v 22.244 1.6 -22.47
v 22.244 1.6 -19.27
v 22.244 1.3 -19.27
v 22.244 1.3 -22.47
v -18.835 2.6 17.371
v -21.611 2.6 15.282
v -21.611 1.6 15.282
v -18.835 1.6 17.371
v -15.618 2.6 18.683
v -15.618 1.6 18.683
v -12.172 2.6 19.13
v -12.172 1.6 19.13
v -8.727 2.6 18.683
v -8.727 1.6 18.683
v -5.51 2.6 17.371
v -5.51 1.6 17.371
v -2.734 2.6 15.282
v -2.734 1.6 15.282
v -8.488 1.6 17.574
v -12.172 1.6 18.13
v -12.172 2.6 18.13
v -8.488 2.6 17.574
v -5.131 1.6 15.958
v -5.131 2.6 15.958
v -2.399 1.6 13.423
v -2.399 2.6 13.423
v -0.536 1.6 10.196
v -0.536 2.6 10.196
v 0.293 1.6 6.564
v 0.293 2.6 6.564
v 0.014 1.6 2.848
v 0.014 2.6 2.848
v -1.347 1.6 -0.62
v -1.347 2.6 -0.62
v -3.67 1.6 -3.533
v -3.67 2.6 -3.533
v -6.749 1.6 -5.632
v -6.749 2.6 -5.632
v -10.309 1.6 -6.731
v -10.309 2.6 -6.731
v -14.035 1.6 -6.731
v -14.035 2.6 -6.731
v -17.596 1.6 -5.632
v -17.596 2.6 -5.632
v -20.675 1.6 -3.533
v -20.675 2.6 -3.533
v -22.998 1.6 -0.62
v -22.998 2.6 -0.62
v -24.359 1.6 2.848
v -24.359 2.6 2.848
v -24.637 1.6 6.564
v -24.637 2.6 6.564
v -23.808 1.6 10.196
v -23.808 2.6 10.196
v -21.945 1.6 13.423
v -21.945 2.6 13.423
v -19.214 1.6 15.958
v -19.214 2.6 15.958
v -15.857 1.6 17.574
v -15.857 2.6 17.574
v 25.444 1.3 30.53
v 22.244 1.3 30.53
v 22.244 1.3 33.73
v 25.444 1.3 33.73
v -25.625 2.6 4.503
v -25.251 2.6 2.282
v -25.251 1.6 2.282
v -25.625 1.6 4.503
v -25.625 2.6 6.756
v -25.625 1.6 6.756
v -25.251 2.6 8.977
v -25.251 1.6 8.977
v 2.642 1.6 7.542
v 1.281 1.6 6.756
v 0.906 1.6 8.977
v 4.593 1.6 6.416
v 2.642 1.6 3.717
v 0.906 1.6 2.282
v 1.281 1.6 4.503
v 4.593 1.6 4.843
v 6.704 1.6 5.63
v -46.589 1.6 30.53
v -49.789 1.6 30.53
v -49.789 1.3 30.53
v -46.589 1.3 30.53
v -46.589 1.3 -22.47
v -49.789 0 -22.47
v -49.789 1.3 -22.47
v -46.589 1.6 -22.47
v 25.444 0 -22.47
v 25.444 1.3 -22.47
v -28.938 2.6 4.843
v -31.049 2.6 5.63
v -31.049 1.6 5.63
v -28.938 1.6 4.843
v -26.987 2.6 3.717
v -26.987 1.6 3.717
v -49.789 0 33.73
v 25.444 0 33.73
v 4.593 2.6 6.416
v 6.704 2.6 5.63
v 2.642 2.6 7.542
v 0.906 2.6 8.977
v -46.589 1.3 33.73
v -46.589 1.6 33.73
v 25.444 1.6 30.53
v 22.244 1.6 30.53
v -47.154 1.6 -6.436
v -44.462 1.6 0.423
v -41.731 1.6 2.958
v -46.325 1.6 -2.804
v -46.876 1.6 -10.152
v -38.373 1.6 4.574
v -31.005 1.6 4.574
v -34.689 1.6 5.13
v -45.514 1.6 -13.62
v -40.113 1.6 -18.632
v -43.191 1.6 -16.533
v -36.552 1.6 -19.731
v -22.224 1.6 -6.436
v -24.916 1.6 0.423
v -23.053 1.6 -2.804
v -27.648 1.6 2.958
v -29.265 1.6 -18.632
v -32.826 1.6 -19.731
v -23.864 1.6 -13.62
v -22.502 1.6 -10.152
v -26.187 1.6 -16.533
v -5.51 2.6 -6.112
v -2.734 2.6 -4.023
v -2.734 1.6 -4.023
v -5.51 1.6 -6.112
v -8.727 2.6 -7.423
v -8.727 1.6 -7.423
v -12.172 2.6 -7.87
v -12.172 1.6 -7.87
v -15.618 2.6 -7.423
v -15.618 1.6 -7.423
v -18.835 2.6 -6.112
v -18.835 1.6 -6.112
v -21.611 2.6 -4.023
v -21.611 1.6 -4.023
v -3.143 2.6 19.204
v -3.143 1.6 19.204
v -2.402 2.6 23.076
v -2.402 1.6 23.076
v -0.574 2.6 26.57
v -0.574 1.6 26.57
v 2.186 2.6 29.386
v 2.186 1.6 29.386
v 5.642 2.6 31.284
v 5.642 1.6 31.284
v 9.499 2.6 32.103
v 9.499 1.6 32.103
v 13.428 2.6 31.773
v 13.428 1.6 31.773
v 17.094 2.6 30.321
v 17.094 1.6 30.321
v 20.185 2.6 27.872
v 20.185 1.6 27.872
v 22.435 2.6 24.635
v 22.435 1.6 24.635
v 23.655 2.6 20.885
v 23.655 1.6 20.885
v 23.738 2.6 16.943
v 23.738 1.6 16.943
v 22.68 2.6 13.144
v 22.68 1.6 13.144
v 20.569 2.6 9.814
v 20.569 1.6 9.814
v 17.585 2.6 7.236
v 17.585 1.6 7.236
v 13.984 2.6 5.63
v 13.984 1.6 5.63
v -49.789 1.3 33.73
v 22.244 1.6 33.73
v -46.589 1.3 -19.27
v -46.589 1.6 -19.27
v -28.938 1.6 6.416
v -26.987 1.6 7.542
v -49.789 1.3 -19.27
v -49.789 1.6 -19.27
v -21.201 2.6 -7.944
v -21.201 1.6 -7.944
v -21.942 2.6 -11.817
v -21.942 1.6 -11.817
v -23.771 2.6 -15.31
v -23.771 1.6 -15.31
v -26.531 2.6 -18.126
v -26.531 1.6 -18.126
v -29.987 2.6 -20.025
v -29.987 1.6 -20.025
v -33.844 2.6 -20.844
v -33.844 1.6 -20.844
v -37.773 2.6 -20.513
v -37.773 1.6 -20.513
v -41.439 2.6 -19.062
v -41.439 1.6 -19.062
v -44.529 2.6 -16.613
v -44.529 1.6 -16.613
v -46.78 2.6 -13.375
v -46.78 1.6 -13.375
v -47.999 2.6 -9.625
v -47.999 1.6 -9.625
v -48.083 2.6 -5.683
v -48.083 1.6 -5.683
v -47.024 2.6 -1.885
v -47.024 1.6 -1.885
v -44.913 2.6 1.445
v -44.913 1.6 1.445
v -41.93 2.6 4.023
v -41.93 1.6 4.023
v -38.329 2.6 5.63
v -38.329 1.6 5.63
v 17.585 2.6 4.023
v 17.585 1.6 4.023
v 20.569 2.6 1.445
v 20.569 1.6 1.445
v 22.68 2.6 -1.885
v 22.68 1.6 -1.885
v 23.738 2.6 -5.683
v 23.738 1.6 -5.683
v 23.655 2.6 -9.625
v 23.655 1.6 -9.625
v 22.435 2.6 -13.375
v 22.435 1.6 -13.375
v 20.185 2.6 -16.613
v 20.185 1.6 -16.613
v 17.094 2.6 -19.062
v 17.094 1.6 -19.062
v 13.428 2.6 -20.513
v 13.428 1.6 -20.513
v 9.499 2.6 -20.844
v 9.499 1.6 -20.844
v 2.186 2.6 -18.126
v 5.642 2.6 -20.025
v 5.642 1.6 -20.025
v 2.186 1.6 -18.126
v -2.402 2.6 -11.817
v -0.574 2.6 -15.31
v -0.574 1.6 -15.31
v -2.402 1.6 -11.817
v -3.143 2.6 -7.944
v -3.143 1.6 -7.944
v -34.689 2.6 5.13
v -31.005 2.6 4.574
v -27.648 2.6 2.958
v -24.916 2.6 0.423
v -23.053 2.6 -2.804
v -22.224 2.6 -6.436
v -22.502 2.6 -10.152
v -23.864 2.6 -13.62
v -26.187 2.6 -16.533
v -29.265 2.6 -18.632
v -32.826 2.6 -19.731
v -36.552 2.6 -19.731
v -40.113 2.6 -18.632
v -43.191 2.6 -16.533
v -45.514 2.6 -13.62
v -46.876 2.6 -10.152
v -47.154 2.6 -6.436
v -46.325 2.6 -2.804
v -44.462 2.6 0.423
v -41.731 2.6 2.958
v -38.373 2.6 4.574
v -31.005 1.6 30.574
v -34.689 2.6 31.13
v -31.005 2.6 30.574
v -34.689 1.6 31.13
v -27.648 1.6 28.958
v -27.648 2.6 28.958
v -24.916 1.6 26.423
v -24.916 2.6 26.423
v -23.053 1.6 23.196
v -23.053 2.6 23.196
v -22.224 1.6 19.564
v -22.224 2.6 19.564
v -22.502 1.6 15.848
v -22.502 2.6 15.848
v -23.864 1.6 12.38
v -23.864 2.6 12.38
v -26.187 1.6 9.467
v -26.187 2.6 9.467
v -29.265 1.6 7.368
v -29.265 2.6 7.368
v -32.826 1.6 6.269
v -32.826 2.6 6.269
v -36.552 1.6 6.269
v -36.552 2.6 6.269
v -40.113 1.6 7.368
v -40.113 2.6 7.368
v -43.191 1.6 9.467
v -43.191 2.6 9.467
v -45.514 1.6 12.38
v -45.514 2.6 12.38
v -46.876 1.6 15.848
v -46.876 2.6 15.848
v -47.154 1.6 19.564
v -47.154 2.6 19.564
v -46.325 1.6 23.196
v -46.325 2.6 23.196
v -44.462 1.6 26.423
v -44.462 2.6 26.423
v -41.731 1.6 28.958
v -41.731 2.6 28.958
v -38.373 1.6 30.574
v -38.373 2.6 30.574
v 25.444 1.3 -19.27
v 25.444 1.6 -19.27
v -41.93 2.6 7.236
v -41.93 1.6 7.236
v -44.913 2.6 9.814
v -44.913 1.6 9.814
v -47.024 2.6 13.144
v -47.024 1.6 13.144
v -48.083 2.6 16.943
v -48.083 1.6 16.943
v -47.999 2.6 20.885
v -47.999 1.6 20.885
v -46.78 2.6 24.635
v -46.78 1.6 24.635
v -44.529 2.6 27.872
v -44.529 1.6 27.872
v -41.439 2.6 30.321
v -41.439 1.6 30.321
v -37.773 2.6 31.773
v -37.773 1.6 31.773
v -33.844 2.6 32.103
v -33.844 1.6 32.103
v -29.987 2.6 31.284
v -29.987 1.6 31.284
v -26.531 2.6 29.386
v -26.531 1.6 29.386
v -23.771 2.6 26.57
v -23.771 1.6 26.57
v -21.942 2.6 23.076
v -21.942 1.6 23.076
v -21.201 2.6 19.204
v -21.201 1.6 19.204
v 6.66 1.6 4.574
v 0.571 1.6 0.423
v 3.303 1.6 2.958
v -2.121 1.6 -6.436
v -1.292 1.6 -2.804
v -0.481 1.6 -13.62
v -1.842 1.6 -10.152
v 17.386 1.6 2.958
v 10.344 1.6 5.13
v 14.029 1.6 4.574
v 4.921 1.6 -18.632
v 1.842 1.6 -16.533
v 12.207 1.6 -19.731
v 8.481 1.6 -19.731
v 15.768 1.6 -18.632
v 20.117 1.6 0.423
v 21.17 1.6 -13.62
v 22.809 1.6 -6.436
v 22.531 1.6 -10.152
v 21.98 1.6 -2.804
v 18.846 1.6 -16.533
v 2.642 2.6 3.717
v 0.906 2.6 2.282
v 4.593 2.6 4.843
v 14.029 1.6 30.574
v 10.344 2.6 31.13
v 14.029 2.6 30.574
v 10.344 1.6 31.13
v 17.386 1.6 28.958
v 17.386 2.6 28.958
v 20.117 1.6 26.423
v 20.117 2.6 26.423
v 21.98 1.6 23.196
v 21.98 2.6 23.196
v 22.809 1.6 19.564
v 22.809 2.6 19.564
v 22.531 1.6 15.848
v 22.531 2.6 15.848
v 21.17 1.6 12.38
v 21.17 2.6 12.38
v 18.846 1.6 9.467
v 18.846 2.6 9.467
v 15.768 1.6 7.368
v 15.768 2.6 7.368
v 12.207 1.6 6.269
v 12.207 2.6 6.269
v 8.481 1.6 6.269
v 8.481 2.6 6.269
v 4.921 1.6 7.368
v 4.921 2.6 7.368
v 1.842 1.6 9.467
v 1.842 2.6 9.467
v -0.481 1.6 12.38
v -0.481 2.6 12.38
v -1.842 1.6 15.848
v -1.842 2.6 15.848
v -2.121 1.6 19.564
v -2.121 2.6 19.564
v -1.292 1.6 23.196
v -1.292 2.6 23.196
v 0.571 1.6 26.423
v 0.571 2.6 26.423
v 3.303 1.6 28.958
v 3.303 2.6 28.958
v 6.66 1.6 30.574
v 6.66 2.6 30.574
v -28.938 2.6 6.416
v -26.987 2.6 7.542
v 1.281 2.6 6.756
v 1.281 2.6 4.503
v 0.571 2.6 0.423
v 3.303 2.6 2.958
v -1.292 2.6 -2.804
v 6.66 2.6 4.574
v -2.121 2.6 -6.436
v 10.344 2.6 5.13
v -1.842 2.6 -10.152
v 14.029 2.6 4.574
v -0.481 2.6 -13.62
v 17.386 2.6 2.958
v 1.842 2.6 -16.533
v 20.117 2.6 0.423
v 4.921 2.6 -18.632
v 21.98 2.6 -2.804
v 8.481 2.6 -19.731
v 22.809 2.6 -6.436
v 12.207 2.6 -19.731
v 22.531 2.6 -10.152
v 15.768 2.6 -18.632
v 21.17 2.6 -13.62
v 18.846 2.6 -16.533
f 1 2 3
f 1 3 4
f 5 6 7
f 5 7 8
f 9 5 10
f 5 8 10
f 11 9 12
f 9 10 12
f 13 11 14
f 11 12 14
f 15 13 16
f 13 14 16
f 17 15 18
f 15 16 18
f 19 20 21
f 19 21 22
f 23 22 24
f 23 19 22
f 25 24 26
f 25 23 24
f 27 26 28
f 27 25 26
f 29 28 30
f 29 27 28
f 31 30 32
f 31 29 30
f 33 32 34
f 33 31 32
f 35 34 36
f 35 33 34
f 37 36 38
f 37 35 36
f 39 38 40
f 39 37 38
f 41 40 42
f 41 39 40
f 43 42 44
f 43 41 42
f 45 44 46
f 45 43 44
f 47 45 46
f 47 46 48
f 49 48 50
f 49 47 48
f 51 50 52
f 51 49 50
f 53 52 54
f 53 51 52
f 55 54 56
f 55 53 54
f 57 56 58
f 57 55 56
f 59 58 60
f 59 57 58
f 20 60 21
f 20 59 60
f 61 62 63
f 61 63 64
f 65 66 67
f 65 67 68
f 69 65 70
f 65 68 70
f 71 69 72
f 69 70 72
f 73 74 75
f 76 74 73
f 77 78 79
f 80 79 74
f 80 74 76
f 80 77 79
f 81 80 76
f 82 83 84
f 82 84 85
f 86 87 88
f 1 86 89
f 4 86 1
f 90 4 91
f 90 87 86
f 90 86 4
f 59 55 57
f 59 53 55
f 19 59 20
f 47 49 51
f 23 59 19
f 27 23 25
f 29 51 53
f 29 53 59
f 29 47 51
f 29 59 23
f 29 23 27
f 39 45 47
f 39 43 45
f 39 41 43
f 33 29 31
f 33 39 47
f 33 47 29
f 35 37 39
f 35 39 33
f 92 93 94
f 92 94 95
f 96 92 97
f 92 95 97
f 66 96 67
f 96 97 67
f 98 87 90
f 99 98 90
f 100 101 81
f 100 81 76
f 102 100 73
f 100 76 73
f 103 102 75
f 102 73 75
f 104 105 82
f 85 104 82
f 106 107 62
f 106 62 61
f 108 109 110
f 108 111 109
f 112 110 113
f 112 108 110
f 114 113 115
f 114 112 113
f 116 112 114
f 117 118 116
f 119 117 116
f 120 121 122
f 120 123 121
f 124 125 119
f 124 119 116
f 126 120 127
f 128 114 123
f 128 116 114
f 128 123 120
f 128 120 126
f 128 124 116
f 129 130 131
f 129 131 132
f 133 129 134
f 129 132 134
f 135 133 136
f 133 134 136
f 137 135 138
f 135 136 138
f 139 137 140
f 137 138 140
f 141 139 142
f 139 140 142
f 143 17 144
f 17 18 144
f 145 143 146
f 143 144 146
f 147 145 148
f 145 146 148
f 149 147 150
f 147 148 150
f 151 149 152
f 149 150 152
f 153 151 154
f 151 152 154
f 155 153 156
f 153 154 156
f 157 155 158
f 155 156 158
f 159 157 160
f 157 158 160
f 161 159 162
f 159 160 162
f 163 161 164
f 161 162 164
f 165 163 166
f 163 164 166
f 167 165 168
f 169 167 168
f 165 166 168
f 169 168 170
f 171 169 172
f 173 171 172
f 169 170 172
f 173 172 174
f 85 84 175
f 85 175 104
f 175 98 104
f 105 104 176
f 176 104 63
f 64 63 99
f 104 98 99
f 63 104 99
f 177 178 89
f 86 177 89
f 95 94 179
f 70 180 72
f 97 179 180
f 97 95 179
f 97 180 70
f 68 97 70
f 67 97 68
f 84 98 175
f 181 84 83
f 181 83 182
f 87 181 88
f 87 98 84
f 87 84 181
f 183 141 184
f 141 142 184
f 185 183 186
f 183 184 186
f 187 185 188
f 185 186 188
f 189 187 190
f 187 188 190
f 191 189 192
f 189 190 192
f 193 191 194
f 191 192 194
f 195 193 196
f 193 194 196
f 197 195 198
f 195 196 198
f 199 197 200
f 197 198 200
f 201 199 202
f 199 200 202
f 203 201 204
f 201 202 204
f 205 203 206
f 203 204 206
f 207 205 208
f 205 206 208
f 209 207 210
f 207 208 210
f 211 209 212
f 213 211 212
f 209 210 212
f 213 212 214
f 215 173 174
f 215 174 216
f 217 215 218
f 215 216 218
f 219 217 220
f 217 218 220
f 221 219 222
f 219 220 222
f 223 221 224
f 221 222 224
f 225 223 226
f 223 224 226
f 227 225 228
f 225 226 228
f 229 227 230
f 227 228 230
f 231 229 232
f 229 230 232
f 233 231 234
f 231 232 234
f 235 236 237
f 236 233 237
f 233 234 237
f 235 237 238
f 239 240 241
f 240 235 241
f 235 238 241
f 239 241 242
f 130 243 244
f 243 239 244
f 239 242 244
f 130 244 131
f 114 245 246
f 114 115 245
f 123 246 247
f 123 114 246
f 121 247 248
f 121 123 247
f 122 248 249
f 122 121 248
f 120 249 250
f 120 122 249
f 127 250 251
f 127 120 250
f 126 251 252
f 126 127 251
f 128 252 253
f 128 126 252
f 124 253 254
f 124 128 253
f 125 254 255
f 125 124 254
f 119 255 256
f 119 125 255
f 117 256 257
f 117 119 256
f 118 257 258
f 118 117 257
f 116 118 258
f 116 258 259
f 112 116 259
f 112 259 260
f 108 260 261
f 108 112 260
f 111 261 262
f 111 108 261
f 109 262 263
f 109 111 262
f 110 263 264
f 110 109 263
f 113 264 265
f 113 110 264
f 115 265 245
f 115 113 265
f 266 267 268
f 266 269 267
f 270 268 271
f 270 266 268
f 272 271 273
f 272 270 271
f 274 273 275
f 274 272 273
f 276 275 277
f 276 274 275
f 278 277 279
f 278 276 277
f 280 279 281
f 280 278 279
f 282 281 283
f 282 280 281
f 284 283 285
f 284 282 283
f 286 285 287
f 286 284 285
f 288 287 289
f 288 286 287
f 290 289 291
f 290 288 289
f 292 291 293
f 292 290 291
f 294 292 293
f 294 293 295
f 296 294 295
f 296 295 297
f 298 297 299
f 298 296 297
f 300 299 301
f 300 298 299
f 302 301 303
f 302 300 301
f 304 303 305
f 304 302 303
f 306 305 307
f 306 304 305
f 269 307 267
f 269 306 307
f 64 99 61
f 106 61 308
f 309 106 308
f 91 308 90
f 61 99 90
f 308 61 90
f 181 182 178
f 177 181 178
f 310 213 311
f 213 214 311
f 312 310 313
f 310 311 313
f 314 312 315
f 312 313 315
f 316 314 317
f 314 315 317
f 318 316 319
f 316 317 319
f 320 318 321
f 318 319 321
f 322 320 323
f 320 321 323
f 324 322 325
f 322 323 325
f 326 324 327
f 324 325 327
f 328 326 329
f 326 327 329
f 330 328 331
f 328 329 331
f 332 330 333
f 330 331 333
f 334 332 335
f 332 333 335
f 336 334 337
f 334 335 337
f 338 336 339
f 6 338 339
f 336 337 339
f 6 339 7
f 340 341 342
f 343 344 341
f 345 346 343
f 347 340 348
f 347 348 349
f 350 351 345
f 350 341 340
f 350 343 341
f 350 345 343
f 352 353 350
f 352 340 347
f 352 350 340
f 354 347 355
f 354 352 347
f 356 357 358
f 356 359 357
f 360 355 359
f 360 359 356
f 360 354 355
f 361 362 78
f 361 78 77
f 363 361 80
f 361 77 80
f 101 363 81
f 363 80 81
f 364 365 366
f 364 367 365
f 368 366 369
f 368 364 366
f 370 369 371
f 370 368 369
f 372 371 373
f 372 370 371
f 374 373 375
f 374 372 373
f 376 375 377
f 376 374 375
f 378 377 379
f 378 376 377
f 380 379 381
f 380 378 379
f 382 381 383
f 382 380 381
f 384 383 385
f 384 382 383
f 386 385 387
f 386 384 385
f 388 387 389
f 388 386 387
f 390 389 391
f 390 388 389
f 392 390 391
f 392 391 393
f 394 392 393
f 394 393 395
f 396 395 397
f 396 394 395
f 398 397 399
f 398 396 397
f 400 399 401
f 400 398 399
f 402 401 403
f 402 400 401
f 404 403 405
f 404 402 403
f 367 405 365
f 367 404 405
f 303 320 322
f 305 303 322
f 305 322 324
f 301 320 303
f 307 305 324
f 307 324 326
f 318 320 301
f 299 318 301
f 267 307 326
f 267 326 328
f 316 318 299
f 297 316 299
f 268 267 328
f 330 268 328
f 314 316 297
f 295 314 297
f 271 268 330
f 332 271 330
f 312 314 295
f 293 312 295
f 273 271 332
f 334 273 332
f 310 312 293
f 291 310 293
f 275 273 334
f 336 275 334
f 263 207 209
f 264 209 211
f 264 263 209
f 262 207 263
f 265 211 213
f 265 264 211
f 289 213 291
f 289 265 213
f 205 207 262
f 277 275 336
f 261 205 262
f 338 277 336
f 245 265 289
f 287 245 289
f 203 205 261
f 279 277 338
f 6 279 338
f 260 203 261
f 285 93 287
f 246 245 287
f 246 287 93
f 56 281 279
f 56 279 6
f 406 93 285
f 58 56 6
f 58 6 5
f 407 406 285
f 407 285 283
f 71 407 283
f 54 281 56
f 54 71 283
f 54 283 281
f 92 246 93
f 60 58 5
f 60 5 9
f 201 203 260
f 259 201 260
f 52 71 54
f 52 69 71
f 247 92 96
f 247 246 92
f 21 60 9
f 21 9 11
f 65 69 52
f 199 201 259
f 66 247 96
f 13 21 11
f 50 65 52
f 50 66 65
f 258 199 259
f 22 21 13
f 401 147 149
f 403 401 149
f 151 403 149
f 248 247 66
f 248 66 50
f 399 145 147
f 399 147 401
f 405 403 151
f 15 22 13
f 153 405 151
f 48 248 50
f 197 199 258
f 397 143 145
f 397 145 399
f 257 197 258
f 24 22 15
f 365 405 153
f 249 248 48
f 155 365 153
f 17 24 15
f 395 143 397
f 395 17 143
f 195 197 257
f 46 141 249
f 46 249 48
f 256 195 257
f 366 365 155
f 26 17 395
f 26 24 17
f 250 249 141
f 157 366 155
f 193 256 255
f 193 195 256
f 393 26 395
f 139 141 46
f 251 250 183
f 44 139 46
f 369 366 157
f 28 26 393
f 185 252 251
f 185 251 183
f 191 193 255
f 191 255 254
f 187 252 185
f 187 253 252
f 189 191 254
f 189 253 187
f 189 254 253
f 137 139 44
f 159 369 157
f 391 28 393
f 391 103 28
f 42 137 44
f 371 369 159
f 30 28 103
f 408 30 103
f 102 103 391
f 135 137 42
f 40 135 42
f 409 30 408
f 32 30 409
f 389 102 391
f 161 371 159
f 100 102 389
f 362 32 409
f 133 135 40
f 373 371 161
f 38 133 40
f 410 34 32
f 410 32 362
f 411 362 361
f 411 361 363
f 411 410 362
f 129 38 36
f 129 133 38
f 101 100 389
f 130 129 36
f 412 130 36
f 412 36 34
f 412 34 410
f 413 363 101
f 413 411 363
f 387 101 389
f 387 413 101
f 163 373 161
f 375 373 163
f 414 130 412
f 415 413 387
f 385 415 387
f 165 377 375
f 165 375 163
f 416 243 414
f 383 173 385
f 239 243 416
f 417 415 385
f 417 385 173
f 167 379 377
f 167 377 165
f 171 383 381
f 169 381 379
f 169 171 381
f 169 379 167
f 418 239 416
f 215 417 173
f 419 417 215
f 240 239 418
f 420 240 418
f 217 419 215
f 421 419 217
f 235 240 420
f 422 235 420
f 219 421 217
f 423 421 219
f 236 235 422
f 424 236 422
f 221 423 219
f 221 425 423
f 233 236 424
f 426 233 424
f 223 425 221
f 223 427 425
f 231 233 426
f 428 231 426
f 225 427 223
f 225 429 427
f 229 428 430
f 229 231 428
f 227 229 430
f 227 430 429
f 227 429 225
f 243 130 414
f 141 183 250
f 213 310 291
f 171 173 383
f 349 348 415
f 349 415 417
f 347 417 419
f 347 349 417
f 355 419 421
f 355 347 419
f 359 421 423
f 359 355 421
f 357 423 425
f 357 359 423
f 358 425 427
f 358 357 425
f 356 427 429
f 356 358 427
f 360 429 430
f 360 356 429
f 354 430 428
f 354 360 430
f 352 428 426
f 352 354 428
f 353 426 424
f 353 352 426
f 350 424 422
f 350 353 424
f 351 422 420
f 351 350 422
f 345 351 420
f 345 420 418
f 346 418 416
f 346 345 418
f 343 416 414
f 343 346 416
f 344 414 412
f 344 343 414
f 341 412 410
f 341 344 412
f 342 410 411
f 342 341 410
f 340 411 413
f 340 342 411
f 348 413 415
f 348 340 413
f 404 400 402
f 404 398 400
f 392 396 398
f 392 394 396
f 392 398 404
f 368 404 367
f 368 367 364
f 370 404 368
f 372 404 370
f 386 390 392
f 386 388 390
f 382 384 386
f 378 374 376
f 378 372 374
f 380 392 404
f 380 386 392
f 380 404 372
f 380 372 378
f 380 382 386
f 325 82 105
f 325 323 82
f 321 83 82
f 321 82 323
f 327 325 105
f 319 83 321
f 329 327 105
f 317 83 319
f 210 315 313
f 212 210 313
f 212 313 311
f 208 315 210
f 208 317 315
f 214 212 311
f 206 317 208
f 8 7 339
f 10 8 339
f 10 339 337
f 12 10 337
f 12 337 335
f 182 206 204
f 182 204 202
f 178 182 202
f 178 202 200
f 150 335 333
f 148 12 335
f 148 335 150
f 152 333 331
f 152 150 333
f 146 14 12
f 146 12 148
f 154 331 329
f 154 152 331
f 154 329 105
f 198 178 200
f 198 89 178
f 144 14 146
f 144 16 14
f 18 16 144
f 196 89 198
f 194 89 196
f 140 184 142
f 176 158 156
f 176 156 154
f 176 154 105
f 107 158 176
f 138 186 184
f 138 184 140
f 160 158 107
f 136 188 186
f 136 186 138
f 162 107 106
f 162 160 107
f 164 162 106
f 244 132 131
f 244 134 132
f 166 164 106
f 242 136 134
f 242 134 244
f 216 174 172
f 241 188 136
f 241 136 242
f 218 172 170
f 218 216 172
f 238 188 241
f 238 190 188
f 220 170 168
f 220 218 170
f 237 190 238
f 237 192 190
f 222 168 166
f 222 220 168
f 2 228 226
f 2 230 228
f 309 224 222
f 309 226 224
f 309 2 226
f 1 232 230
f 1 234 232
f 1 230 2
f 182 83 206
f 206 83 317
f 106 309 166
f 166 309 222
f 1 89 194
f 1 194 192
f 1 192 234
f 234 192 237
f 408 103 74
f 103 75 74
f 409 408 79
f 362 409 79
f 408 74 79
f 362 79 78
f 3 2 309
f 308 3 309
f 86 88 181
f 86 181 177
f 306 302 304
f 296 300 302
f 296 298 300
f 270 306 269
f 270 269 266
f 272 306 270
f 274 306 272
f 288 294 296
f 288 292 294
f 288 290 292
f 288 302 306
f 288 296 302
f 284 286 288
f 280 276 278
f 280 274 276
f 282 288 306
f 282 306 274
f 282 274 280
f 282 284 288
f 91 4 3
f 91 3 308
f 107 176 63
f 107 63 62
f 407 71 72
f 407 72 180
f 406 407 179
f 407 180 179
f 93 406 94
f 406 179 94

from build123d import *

# Parameters (mm, degrees)
SKETCH1_W           = 75.233320997
SKETCH1_H           = 56.2
BOSS_EXTRUDE1_DEPTH = 1.6
SKETCH2_R           = 13.5
SKETCH2_R_2         = 12.5
BOSS_EXTRUDE2_DEPTH = 1
SKETCH3_W           = 3.2
SKETCH3_H           = 3.2
CUT_EXTRUDE1_DEPTH  = 0.3


with BuildPart() as part:
    # Sketch1 → Boss-Extrude1 (new body)
    with BuildSketch(Plane(origin=(0, 0, 0), x_dir=(1, 0, 0), z_dir=(0, 1, 0))):
        with Locations((-12.172352394, -5.629712982)):
            Rectangle(SKETCH1_W, SKETCH1_H)
    extrude(amount=BOSS_EXTRUDE1_DEPTH)

    # Sketch2 → Boss-Extrude2 (add)
    # profile 1 of 5: a face of its own
    with BuildSketch(Plane(origin=(0, 1.6, 0), x_dir=(1, 0, 0), z_dir=(0, 1, 0))):
        with Locations((10.344308105, 7.370287018)):
            Circle(SKETCH2_R)
        with Locations(Location((10.344308105, 7.370287018, 0), (0, 0, 270))):
            Circle(SKETCH2_R_2, mode=Mode.SUBTRACT)
    # profile 2 of 5: a face of its own
    with BuildSketch(Plane(origin=(0, 1.6, 0), x_dir=(1, 0, 0), z_dir=(0, 1, 0))):
        with Locations((10.344308105, -18.629712982)):
            Circle(SKETCH2_R)
        with Locations(Location((10.344308105, -18.629712982, 0), (0, 0, 270))):
            Circle(SKETCH2_R_2, mode=Mode.SUBTRACT)
    # profile 3 of 5: a face of its own
    with BuildSketch(Plane(origin=(0, 1.6, 0), x_dir=(1, 0, 0), z_dir=(0, 1, 0))):
        with Locations((-12.172352394, -5.629712982)):
            Circle(SKETCH2_R)
        with Locations(Location((-12.172352394, -5.629712982, 0), (0, 0, 270))):
            Circle(SKETCH2_R_2, mode=Mode.SUBTRACT)
    # profile 4 of 5: a face of its own
    with BuildSketch(Plane(origin=(0, 1.6, 0), x_dir=(1, 0, 0), z_dir=(0, 1, 0))):
        with Locations((-34.689012892, 7.370287018)):
            Circle(SKETCH2_R)
        with Locations(Location((-34.689012892, 7.370287018, 0), (0, 0, 270))):
            Circle(SKETCH2_R_2, mode=Mode.SUBTRACT)
    # profile 5 of 5: a face of its own
    with BuildSketch(Plane(origin=(0, 1.6, 0), x_dir=(1, 0, 0), z_dir=(0, 1, 0))):
        with Locations((-34.689012892, -18.629712982)):
            Circle(SKETCH2_R)
        with Locations(Location((-34.689012892, -18.629712982, 0), (0, 0, 270))):
            Circle(SKETCH2_R_2, mode=Mode.SUBTRACT)
    extrude(amount=BOSS_EXTRUDE2_DEPTH)

    # Sketch3 → Cut-Extrude1 (cut)
    with BuildSketch(Plane(origin=(0, 1.6, 0), x_dir=(1, 0, 0), z_dir=(0, 1, 0))):
        with Locations((-48.189012892, -32.129712982)):
            Rectangle(SKETCH3_W, SKETCH3_H)
        with Locations((23.844308105, -32.129712982)):
            Rectangle(SKETCH3_W, SKETCH3_H)
        with Locations((23.844308105, 20.870287018)):
            Rectangle(SKETCH3_W, SKETCH3_H)
        with Locations((-48.189012892, 20.870287018)):
            Rectangle(SKETCH3_W, SKETCH3_H)
    extrude(amount=-CUT_EXTRUDE1_DEPTH, mode=Mode.SUBTRACT)


solid = part.part
